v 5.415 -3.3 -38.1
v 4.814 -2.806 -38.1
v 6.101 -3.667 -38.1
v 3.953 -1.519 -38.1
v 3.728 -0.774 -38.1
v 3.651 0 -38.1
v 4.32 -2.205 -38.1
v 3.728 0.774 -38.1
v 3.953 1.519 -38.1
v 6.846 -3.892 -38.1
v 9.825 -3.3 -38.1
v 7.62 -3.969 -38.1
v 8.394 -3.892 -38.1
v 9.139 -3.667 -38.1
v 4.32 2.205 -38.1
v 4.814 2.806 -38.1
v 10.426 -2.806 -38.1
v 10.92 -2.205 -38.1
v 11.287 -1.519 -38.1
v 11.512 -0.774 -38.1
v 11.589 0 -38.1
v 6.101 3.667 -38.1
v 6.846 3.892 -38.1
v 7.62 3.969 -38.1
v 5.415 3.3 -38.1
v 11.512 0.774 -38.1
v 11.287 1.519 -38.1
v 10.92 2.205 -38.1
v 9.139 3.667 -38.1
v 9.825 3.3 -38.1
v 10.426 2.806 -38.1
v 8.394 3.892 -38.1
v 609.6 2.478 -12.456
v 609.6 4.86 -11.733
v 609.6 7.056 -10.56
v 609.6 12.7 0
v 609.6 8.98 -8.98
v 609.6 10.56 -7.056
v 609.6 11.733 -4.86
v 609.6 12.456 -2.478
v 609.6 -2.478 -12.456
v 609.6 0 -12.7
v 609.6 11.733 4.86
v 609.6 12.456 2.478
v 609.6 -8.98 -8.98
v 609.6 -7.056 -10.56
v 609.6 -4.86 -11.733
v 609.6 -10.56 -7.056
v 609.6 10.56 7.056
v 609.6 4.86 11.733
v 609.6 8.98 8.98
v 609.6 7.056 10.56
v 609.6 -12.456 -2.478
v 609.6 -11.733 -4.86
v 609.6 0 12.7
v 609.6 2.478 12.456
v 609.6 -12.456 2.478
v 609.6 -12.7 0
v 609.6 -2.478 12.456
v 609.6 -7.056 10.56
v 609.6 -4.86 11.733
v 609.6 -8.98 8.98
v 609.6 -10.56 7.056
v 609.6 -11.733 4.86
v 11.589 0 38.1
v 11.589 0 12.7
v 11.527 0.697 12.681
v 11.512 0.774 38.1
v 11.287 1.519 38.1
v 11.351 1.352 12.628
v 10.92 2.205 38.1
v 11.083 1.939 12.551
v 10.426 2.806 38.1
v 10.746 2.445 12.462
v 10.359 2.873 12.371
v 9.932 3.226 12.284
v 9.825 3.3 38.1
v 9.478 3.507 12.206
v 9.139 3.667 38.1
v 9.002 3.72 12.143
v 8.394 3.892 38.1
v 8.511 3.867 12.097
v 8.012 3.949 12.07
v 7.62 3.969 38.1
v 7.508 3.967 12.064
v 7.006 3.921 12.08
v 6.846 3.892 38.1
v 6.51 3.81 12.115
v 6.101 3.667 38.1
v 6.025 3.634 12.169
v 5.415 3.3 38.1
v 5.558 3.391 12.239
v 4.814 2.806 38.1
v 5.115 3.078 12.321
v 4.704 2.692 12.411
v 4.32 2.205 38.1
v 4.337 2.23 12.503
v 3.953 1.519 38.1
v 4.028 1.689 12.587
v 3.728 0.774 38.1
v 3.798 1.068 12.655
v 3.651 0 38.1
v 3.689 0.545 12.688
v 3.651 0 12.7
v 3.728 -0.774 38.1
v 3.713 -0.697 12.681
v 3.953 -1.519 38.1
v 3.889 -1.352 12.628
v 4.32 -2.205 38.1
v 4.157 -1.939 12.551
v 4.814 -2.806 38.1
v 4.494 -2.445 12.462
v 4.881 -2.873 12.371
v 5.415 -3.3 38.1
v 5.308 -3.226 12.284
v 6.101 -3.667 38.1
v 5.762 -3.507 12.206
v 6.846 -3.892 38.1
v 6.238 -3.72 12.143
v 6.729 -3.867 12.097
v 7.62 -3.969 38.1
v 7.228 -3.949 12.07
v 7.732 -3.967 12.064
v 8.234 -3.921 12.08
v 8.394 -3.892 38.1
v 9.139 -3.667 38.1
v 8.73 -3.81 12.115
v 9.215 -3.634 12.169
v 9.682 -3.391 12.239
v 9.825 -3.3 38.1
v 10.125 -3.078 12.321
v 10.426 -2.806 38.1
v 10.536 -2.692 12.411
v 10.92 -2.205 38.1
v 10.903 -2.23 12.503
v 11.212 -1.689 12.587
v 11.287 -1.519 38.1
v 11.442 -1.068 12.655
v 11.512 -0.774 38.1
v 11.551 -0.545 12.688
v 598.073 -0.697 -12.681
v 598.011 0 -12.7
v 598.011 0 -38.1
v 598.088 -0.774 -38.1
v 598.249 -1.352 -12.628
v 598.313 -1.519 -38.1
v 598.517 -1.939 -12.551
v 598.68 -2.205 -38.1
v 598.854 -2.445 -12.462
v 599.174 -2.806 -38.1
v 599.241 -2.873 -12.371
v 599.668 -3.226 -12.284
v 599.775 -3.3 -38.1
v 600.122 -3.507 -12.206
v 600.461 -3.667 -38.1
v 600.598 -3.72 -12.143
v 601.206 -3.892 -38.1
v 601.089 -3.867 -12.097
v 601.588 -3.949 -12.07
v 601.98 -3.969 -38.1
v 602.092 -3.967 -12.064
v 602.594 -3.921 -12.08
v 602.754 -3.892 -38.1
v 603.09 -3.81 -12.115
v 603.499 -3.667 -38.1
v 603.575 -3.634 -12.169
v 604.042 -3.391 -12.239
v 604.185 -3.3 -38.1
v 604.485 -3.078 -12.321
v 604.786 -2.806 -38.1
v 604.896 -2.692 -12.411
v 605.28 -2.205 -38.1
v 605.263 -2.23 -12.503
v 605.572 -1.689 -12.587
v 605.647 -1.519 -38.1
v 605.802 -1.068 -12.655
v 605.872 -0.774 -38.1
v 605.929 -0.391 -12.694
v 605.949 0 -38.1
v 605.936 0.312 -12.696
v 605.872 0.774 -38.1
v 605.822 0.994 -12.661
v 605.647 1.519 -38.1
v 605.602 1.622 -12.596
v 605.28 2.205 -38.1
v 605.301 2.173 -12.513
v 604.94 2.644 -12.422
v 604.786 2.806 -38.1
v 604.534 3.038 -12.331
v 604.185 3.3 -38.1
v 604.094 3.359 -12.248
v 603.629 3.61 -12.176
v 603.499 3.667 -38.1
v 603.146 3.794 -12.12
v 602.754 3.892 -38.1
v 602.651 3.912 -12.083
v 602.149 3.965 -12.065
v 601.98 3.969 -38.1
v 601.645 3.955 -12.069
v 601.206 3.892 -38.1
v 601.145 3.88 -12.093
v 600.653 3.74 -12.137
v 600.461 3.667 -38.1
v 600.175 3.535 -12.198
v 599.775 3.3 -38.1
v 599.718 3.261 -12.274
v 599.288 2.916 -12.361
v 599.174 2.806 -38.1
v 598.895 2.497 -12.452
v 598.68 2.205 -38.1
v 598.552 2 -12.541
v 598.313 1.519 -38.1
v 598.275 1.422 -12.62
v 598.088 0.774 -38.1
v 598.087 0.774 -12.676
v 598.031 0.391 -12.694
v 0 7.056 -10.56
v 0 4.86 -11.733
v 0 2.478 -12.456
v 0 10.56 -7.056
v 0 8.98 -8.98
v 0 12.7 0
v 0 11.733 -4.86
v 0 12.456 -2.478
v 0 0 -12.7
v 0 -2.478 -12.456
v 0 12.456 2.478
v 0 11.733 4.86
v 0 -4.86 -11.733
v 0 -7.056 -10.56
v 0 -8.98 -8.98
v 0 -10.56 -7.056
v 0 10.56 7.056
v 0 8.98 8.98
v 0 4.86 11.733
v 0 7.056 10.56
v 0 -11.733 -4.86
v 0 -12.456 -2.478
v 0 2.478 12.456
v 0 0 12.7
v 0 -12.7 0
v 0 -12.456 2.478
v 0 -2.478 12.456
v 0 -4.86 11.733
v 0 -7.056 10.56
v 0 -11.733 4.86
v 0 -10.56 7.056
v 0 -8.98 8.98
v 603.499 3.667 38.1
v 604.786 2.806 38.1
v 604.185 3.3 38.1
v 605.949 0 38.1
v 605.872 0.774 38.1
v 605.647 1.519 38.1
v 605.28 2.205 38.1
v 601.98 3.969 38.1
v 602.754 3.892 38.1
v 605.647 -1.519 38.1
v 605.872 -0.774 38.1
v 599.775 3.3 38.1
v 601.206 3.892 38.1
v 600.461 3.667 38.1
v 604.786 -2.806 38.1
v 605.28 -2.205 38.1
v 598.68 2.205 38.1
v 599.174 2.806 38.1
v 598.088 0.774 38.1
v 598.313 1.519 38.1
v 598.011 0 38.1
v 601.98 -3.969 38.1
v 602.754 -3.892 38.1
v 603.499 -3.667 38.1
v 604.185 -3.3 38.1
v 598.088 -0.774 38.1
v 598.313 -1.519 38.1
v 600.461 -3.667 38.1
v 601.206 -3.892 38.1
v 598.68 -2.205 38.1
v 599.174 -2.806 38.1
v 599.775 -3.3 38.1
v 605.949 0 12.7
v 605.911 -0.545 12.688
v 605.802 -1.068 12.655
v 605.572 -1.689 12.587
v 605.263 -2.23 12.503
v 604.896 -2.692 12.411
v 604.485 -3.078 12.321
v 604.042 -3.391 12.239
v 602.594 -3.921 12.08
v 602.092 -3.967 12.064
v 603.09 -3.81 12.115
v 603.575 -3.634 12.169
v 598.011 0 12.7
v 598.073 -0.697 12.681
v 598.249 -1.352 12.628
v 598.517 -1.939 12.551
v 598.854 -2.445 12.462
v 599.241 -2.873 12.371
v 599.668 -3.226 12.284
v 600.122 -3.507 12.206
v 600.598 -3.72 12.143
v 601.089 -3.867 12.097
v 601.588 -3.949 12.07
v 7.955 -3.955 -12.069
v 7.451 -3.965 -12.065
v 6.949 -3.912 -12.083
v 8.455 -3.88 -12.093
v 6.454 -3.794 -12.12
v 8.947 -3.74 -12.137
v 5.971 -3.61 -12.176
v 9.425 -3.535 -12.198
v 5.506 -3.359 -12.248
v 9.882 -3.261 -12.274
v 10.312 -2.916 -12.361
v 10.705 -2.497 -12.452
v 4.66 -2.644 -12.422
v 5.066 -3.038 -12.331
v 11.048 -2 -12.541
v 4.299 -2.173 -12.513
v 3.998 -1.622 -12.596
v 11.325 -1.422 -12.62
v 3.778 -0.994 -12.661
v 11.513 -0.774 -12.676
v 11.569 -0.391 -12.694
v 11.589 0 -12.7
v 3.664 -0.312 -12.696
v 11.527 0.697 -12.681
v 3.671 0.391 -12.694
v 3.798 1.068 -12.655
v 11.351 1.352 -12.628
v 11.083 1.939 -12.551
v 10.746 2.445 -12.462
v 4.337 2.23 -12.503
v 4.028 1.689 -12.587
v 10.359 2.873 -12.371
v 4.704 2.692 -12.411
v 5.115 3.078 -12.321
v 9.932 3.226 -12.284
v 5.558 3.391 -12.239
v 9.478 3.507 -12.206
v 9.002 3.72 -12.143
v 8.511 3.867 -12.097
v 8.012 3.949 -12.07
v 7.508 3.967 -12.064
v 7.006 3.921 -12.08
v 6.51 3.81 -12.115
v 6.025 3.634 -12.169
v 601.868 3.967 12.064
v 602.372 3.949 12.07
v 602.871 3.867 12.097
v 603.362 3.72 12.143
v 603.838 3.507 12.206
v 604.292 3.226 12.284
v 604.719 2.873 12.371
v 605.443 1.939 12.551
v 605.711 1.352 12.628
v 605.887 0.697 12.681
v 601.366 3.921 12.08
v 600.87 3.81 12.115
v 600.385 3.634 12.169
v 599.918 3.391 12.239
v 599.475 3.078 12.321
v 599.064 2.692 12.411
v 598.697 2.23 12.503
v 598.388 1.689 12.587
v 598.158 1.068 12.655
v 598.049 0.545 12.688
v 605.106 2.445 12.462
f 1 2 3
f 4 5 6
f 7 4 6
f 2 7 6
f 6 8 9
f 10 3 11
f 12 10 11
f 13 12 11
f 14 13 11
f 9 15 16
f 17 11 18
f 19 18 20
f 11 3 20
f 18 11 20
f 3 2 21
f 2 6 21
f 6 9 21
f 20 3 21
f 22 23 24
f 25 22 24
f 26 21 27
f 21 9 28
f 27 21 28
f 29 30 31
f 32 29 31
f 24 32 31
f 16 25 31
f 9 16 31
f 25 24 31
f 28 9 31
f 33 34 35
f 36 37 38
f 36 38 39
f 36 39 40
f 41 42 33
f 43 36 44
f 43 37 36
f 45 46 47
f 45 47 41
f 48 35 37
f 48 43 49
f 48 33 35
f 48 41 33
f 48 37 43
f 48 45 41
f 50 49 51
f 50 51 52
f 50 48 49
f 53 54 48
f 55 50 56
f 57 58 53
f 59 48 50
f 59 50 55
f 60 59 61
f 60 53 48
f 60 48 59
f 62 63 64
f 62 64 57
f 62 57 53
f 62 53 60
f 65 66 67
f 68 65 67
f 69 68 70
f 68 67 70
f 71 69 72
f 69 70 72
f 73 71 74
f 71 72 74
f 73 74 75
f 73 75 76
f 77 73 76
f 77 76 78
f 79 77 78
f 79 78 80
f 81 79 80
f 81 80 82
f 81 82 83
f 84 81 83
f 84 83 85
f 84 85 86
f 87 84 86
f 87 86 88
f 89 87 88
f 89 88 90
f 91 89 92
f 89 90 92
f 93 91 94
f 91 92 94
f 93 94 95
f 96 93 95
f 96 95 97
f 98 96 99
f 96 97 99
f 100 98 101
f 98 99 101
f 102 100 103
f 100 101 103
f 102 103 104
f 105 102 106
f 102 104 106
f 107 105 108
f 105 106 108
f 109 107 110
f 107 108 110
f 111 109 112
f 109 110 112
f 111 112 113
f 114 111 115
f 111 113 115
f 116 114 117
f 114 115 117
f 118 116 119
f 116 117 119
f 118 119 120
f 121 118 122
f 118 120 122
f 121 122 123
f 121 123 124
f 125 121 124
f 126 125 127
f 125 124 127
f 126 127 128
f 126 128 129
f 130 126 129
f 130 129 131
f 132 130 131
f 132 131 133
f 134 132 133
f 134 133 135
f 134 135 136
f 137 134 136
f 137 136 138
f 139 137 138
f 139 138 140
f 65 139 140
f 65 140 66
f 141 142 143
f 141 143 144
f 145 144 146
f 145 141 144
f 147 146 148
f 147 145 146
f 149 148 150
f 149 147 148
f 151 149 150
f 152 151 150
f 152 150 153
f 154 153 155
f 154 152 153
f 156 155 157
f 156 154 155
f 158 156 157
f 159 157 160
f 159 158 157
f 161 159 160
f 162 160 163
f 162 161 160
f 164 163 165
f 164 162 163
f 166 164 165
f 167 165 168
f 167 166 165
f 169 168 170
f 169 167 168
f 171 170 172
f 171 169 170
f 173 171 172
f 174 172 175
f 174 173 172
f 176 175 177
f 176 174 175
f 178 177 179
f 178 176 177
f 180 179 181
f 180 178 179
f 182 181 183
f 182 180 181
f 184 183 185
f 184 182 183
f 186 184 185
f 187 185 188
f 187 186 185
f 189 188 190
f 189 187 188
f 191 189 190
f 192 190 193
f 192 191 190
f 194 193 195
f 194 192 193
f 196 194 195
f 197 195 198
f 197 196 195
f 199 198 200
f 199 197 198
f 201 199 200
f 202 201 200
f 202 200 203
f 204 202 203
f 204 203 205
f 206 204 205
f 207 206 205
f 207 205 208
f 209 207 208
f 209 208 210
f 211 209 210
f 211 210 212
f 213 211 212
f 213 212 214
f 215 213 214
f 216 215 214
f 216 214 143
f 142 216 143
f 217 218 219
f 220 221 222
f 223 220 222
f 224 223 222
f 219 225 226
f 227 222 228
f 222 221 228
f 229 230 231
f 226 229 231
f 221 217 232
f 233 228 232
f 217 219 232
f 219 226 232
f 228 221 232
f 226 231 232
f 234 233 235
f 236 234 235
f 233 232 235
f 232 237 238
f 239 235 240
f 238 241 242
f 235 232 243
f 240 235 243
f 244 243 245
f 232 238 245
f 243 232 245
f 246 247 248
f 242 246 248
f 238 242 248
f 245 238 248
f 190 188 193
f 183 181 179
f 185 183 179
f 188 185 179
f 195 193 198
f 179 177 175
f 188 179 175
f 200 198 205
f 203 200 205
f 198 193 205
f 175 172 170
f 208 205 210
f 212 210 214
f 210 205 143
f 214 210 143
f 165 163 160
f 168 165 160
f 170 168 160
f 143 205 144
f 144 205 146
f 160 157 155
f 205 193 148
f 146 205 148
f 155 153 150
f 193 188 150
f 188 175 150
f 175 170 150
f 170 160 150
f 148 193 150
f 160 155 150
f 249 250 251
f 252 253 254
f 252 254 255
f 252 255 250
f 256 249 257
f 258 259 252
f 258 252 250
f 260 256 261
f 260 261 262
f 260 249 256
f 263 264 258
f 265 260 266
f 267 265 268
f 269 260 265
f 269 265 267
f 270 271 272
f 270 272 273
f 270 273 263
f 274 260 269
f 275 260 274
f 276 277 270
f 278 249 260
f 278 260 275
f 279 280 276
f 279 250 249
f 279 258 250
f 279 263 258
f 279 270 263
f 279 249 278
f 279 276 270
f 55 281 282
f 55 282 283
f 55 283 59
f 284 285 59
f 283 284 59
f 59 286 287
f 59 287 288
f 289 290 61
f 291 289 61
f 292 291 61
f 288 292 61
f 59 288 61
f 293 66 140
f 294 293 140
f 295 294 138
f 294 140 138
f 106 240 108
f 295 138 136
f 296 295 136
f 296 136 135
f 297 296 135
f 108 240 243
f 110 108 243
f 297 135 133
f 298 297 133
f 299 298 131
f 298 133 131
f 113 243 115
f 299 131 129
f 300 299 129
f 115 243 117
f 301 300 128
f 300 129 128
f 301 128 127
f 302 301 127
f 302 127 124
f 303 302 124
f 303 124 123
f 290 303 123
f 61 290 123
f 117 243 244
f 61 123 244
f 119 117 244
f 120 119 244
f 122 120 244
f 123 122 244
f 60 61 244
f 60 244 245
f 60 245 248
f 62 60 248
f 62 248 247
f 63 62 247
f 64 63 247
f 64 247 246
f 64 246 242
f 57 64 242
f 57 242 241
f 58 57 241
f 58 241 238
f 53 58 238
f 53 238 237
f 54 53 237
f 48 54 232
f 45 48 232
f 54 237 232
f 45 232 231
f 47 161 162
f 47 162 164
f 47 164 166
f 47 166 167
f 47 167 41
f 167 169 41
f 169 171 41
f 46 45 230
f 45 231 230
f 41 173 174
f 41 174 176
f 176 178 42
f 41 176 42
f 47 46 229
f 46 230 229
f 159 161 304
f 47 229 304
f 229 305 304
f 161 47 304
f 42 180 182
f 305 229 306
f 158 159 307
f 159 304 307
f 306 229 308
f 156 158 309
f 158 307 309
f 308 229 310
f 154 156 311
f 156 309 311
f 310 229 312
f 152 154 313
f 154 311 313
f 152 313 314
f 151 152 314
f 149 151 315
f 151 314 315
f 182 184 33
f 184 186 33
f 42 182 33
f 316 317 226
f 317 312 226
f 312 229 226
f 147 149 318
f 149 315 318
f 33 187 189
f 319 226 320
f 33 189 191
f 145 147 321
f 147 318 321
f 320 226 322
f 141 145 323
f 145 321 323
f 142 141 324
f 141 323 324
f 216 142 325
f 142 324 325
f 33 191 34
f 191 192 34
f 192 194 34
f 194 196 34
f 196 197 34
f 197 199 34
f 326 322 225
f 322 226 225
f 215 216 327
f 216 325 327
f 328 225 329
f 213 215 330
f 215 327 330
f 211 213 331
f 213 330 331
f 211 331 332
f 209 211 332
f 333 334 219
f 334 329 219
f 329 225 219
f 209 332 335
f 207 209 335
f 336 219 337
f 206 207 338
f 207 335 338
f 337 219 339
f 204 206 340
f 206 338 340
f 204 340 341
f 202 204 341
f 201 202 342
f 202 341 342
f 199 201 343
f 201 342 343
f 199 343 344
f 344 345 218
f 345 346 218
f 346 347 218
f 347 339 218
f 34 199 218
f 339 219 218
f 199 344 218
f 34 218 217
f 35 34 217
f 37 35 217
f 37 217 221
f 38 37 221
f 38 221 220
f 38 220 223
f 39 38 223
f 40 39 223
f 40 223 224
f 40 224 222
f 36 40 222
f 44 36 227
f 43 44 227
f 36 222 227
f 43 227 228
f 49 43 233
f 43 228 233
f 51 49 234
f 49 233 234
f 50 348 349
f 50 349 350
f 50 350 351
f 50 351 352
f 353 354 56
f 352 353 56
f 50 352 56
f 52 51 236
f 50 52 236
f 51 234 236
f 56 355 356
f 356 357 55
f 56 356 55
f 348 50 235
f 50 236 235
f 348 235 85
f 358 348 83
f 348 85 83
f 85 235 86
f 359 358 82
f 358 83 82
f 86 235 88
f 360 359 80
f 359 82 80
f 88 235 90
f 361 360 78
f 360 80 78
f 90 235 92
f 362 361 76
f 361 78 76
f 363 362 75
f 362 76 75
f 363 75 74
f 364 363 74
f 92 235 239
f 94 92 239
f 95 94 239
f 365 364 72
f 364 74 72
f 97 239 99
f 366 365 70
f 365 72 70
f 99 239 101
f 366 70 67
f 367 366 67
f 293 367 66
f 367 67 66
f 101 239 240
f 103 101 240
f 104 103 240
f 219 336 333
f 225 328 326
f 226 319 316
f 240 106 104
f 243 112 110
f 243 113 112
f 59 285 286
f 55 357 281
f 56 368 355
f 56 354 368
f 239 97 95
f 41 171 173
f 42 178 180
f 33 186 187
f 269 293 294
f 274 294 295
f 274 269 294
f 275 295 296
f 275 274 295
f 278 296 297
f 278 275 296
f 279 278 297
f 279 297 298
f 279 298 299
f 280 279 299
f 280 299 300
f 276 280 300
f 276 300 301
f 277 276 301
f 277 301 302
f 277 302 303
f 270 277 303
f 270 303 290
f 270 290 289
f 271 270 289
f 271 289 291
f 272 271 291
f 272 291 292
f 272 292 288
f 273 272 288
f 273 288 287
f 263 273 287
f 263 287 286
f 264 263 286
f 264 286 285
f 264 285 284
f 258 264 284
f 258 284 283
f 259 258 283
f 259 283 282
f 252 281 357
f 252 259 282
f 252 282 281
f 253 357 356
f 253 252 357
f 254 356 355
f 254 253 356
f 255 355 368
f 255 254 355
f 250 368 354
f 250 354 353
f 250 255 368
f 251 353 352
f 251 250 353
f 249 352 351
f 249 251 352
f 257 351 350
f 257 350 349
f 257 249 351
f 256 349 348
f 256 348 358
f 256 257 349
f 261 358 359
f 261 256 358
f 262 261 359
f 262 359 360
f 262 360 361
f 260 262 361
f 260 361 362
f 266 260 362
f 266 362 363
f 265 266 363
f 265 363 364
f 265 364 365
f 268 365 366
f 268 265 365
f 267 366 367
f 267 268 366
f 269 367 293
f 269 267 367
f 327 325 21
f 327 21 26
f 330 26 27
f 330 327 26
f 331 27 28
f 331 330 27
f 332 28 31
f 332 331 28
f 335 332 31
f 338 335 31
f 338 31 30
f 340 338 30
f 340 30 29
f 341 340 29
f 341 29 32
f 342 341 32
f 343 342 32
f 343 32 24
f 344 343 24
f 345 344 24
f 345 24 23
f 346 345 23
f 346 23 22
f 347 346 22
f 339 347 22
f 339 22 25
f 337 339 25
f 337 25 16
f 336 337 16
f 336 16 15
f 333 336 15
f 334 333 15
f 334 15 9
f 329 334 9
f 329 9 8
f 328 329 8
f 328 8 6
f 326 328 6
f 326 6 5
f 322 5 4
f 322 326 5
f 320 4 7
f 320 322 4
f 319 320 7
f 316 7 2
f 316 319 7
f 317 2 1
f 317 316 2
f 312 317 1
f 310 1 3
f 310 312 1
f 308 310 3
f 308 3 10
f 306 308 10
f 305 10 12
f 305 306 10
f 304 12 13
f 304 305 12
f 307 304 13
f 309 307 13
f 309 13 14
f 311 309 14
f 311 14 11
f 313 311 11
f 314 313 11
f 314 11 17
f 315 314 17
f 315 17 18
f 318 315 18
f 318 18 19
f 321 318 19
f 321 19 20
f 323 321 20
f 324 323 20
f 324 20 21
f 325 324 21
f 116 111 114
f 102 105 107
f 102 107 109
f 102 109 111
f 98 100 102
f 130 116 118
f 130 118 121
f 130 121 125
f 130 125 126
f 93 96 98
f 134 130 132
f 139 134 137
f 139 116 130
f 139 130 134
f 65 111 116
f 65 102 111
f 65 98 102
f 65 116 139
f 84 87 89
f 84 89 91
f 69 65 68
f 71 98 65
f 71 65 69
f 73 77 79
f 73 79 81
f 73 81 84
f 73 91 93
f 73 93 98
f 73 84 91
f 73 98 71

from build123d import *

# Parameters (mm, degrees)
SKETCH1_R           = 12.7
BOSS_EXTRUDE1_DEPTH = 609.6
SKETCH2_R           = 3.96875
BOSS_EXTRUDE2_DEPTH = 38.1


with BuildPart() as part:
    # Sketch1 → Boss-Extrude1 (new body)
    with BuildSketch(Plane(origin=(0, 0, 0), x_dir=(0, 0, -1), z_dir=(1, 0, 0))):
        with Locations(Location((0, 0, 0), (0, 0, 180))):
            Circle(SKETCH1_R)
    extrude(amount=BOSS_EXTRUDE1_DEPTH)

    # Sketch2 → Boss-Extrude2 (add, symmetric)
    with BuildSketch(Plane.XY):
        with Locations((7.62, 0)):
            Circle(SKETCH2_R)
        with Locations(Location((601.98, 0, 0), (0, 0, 180))):
            Circle(SKETCH2_R)
    extrude(amount=BOSS_EXTRUDE2_DEPTH, both=True)


solid = part.part
